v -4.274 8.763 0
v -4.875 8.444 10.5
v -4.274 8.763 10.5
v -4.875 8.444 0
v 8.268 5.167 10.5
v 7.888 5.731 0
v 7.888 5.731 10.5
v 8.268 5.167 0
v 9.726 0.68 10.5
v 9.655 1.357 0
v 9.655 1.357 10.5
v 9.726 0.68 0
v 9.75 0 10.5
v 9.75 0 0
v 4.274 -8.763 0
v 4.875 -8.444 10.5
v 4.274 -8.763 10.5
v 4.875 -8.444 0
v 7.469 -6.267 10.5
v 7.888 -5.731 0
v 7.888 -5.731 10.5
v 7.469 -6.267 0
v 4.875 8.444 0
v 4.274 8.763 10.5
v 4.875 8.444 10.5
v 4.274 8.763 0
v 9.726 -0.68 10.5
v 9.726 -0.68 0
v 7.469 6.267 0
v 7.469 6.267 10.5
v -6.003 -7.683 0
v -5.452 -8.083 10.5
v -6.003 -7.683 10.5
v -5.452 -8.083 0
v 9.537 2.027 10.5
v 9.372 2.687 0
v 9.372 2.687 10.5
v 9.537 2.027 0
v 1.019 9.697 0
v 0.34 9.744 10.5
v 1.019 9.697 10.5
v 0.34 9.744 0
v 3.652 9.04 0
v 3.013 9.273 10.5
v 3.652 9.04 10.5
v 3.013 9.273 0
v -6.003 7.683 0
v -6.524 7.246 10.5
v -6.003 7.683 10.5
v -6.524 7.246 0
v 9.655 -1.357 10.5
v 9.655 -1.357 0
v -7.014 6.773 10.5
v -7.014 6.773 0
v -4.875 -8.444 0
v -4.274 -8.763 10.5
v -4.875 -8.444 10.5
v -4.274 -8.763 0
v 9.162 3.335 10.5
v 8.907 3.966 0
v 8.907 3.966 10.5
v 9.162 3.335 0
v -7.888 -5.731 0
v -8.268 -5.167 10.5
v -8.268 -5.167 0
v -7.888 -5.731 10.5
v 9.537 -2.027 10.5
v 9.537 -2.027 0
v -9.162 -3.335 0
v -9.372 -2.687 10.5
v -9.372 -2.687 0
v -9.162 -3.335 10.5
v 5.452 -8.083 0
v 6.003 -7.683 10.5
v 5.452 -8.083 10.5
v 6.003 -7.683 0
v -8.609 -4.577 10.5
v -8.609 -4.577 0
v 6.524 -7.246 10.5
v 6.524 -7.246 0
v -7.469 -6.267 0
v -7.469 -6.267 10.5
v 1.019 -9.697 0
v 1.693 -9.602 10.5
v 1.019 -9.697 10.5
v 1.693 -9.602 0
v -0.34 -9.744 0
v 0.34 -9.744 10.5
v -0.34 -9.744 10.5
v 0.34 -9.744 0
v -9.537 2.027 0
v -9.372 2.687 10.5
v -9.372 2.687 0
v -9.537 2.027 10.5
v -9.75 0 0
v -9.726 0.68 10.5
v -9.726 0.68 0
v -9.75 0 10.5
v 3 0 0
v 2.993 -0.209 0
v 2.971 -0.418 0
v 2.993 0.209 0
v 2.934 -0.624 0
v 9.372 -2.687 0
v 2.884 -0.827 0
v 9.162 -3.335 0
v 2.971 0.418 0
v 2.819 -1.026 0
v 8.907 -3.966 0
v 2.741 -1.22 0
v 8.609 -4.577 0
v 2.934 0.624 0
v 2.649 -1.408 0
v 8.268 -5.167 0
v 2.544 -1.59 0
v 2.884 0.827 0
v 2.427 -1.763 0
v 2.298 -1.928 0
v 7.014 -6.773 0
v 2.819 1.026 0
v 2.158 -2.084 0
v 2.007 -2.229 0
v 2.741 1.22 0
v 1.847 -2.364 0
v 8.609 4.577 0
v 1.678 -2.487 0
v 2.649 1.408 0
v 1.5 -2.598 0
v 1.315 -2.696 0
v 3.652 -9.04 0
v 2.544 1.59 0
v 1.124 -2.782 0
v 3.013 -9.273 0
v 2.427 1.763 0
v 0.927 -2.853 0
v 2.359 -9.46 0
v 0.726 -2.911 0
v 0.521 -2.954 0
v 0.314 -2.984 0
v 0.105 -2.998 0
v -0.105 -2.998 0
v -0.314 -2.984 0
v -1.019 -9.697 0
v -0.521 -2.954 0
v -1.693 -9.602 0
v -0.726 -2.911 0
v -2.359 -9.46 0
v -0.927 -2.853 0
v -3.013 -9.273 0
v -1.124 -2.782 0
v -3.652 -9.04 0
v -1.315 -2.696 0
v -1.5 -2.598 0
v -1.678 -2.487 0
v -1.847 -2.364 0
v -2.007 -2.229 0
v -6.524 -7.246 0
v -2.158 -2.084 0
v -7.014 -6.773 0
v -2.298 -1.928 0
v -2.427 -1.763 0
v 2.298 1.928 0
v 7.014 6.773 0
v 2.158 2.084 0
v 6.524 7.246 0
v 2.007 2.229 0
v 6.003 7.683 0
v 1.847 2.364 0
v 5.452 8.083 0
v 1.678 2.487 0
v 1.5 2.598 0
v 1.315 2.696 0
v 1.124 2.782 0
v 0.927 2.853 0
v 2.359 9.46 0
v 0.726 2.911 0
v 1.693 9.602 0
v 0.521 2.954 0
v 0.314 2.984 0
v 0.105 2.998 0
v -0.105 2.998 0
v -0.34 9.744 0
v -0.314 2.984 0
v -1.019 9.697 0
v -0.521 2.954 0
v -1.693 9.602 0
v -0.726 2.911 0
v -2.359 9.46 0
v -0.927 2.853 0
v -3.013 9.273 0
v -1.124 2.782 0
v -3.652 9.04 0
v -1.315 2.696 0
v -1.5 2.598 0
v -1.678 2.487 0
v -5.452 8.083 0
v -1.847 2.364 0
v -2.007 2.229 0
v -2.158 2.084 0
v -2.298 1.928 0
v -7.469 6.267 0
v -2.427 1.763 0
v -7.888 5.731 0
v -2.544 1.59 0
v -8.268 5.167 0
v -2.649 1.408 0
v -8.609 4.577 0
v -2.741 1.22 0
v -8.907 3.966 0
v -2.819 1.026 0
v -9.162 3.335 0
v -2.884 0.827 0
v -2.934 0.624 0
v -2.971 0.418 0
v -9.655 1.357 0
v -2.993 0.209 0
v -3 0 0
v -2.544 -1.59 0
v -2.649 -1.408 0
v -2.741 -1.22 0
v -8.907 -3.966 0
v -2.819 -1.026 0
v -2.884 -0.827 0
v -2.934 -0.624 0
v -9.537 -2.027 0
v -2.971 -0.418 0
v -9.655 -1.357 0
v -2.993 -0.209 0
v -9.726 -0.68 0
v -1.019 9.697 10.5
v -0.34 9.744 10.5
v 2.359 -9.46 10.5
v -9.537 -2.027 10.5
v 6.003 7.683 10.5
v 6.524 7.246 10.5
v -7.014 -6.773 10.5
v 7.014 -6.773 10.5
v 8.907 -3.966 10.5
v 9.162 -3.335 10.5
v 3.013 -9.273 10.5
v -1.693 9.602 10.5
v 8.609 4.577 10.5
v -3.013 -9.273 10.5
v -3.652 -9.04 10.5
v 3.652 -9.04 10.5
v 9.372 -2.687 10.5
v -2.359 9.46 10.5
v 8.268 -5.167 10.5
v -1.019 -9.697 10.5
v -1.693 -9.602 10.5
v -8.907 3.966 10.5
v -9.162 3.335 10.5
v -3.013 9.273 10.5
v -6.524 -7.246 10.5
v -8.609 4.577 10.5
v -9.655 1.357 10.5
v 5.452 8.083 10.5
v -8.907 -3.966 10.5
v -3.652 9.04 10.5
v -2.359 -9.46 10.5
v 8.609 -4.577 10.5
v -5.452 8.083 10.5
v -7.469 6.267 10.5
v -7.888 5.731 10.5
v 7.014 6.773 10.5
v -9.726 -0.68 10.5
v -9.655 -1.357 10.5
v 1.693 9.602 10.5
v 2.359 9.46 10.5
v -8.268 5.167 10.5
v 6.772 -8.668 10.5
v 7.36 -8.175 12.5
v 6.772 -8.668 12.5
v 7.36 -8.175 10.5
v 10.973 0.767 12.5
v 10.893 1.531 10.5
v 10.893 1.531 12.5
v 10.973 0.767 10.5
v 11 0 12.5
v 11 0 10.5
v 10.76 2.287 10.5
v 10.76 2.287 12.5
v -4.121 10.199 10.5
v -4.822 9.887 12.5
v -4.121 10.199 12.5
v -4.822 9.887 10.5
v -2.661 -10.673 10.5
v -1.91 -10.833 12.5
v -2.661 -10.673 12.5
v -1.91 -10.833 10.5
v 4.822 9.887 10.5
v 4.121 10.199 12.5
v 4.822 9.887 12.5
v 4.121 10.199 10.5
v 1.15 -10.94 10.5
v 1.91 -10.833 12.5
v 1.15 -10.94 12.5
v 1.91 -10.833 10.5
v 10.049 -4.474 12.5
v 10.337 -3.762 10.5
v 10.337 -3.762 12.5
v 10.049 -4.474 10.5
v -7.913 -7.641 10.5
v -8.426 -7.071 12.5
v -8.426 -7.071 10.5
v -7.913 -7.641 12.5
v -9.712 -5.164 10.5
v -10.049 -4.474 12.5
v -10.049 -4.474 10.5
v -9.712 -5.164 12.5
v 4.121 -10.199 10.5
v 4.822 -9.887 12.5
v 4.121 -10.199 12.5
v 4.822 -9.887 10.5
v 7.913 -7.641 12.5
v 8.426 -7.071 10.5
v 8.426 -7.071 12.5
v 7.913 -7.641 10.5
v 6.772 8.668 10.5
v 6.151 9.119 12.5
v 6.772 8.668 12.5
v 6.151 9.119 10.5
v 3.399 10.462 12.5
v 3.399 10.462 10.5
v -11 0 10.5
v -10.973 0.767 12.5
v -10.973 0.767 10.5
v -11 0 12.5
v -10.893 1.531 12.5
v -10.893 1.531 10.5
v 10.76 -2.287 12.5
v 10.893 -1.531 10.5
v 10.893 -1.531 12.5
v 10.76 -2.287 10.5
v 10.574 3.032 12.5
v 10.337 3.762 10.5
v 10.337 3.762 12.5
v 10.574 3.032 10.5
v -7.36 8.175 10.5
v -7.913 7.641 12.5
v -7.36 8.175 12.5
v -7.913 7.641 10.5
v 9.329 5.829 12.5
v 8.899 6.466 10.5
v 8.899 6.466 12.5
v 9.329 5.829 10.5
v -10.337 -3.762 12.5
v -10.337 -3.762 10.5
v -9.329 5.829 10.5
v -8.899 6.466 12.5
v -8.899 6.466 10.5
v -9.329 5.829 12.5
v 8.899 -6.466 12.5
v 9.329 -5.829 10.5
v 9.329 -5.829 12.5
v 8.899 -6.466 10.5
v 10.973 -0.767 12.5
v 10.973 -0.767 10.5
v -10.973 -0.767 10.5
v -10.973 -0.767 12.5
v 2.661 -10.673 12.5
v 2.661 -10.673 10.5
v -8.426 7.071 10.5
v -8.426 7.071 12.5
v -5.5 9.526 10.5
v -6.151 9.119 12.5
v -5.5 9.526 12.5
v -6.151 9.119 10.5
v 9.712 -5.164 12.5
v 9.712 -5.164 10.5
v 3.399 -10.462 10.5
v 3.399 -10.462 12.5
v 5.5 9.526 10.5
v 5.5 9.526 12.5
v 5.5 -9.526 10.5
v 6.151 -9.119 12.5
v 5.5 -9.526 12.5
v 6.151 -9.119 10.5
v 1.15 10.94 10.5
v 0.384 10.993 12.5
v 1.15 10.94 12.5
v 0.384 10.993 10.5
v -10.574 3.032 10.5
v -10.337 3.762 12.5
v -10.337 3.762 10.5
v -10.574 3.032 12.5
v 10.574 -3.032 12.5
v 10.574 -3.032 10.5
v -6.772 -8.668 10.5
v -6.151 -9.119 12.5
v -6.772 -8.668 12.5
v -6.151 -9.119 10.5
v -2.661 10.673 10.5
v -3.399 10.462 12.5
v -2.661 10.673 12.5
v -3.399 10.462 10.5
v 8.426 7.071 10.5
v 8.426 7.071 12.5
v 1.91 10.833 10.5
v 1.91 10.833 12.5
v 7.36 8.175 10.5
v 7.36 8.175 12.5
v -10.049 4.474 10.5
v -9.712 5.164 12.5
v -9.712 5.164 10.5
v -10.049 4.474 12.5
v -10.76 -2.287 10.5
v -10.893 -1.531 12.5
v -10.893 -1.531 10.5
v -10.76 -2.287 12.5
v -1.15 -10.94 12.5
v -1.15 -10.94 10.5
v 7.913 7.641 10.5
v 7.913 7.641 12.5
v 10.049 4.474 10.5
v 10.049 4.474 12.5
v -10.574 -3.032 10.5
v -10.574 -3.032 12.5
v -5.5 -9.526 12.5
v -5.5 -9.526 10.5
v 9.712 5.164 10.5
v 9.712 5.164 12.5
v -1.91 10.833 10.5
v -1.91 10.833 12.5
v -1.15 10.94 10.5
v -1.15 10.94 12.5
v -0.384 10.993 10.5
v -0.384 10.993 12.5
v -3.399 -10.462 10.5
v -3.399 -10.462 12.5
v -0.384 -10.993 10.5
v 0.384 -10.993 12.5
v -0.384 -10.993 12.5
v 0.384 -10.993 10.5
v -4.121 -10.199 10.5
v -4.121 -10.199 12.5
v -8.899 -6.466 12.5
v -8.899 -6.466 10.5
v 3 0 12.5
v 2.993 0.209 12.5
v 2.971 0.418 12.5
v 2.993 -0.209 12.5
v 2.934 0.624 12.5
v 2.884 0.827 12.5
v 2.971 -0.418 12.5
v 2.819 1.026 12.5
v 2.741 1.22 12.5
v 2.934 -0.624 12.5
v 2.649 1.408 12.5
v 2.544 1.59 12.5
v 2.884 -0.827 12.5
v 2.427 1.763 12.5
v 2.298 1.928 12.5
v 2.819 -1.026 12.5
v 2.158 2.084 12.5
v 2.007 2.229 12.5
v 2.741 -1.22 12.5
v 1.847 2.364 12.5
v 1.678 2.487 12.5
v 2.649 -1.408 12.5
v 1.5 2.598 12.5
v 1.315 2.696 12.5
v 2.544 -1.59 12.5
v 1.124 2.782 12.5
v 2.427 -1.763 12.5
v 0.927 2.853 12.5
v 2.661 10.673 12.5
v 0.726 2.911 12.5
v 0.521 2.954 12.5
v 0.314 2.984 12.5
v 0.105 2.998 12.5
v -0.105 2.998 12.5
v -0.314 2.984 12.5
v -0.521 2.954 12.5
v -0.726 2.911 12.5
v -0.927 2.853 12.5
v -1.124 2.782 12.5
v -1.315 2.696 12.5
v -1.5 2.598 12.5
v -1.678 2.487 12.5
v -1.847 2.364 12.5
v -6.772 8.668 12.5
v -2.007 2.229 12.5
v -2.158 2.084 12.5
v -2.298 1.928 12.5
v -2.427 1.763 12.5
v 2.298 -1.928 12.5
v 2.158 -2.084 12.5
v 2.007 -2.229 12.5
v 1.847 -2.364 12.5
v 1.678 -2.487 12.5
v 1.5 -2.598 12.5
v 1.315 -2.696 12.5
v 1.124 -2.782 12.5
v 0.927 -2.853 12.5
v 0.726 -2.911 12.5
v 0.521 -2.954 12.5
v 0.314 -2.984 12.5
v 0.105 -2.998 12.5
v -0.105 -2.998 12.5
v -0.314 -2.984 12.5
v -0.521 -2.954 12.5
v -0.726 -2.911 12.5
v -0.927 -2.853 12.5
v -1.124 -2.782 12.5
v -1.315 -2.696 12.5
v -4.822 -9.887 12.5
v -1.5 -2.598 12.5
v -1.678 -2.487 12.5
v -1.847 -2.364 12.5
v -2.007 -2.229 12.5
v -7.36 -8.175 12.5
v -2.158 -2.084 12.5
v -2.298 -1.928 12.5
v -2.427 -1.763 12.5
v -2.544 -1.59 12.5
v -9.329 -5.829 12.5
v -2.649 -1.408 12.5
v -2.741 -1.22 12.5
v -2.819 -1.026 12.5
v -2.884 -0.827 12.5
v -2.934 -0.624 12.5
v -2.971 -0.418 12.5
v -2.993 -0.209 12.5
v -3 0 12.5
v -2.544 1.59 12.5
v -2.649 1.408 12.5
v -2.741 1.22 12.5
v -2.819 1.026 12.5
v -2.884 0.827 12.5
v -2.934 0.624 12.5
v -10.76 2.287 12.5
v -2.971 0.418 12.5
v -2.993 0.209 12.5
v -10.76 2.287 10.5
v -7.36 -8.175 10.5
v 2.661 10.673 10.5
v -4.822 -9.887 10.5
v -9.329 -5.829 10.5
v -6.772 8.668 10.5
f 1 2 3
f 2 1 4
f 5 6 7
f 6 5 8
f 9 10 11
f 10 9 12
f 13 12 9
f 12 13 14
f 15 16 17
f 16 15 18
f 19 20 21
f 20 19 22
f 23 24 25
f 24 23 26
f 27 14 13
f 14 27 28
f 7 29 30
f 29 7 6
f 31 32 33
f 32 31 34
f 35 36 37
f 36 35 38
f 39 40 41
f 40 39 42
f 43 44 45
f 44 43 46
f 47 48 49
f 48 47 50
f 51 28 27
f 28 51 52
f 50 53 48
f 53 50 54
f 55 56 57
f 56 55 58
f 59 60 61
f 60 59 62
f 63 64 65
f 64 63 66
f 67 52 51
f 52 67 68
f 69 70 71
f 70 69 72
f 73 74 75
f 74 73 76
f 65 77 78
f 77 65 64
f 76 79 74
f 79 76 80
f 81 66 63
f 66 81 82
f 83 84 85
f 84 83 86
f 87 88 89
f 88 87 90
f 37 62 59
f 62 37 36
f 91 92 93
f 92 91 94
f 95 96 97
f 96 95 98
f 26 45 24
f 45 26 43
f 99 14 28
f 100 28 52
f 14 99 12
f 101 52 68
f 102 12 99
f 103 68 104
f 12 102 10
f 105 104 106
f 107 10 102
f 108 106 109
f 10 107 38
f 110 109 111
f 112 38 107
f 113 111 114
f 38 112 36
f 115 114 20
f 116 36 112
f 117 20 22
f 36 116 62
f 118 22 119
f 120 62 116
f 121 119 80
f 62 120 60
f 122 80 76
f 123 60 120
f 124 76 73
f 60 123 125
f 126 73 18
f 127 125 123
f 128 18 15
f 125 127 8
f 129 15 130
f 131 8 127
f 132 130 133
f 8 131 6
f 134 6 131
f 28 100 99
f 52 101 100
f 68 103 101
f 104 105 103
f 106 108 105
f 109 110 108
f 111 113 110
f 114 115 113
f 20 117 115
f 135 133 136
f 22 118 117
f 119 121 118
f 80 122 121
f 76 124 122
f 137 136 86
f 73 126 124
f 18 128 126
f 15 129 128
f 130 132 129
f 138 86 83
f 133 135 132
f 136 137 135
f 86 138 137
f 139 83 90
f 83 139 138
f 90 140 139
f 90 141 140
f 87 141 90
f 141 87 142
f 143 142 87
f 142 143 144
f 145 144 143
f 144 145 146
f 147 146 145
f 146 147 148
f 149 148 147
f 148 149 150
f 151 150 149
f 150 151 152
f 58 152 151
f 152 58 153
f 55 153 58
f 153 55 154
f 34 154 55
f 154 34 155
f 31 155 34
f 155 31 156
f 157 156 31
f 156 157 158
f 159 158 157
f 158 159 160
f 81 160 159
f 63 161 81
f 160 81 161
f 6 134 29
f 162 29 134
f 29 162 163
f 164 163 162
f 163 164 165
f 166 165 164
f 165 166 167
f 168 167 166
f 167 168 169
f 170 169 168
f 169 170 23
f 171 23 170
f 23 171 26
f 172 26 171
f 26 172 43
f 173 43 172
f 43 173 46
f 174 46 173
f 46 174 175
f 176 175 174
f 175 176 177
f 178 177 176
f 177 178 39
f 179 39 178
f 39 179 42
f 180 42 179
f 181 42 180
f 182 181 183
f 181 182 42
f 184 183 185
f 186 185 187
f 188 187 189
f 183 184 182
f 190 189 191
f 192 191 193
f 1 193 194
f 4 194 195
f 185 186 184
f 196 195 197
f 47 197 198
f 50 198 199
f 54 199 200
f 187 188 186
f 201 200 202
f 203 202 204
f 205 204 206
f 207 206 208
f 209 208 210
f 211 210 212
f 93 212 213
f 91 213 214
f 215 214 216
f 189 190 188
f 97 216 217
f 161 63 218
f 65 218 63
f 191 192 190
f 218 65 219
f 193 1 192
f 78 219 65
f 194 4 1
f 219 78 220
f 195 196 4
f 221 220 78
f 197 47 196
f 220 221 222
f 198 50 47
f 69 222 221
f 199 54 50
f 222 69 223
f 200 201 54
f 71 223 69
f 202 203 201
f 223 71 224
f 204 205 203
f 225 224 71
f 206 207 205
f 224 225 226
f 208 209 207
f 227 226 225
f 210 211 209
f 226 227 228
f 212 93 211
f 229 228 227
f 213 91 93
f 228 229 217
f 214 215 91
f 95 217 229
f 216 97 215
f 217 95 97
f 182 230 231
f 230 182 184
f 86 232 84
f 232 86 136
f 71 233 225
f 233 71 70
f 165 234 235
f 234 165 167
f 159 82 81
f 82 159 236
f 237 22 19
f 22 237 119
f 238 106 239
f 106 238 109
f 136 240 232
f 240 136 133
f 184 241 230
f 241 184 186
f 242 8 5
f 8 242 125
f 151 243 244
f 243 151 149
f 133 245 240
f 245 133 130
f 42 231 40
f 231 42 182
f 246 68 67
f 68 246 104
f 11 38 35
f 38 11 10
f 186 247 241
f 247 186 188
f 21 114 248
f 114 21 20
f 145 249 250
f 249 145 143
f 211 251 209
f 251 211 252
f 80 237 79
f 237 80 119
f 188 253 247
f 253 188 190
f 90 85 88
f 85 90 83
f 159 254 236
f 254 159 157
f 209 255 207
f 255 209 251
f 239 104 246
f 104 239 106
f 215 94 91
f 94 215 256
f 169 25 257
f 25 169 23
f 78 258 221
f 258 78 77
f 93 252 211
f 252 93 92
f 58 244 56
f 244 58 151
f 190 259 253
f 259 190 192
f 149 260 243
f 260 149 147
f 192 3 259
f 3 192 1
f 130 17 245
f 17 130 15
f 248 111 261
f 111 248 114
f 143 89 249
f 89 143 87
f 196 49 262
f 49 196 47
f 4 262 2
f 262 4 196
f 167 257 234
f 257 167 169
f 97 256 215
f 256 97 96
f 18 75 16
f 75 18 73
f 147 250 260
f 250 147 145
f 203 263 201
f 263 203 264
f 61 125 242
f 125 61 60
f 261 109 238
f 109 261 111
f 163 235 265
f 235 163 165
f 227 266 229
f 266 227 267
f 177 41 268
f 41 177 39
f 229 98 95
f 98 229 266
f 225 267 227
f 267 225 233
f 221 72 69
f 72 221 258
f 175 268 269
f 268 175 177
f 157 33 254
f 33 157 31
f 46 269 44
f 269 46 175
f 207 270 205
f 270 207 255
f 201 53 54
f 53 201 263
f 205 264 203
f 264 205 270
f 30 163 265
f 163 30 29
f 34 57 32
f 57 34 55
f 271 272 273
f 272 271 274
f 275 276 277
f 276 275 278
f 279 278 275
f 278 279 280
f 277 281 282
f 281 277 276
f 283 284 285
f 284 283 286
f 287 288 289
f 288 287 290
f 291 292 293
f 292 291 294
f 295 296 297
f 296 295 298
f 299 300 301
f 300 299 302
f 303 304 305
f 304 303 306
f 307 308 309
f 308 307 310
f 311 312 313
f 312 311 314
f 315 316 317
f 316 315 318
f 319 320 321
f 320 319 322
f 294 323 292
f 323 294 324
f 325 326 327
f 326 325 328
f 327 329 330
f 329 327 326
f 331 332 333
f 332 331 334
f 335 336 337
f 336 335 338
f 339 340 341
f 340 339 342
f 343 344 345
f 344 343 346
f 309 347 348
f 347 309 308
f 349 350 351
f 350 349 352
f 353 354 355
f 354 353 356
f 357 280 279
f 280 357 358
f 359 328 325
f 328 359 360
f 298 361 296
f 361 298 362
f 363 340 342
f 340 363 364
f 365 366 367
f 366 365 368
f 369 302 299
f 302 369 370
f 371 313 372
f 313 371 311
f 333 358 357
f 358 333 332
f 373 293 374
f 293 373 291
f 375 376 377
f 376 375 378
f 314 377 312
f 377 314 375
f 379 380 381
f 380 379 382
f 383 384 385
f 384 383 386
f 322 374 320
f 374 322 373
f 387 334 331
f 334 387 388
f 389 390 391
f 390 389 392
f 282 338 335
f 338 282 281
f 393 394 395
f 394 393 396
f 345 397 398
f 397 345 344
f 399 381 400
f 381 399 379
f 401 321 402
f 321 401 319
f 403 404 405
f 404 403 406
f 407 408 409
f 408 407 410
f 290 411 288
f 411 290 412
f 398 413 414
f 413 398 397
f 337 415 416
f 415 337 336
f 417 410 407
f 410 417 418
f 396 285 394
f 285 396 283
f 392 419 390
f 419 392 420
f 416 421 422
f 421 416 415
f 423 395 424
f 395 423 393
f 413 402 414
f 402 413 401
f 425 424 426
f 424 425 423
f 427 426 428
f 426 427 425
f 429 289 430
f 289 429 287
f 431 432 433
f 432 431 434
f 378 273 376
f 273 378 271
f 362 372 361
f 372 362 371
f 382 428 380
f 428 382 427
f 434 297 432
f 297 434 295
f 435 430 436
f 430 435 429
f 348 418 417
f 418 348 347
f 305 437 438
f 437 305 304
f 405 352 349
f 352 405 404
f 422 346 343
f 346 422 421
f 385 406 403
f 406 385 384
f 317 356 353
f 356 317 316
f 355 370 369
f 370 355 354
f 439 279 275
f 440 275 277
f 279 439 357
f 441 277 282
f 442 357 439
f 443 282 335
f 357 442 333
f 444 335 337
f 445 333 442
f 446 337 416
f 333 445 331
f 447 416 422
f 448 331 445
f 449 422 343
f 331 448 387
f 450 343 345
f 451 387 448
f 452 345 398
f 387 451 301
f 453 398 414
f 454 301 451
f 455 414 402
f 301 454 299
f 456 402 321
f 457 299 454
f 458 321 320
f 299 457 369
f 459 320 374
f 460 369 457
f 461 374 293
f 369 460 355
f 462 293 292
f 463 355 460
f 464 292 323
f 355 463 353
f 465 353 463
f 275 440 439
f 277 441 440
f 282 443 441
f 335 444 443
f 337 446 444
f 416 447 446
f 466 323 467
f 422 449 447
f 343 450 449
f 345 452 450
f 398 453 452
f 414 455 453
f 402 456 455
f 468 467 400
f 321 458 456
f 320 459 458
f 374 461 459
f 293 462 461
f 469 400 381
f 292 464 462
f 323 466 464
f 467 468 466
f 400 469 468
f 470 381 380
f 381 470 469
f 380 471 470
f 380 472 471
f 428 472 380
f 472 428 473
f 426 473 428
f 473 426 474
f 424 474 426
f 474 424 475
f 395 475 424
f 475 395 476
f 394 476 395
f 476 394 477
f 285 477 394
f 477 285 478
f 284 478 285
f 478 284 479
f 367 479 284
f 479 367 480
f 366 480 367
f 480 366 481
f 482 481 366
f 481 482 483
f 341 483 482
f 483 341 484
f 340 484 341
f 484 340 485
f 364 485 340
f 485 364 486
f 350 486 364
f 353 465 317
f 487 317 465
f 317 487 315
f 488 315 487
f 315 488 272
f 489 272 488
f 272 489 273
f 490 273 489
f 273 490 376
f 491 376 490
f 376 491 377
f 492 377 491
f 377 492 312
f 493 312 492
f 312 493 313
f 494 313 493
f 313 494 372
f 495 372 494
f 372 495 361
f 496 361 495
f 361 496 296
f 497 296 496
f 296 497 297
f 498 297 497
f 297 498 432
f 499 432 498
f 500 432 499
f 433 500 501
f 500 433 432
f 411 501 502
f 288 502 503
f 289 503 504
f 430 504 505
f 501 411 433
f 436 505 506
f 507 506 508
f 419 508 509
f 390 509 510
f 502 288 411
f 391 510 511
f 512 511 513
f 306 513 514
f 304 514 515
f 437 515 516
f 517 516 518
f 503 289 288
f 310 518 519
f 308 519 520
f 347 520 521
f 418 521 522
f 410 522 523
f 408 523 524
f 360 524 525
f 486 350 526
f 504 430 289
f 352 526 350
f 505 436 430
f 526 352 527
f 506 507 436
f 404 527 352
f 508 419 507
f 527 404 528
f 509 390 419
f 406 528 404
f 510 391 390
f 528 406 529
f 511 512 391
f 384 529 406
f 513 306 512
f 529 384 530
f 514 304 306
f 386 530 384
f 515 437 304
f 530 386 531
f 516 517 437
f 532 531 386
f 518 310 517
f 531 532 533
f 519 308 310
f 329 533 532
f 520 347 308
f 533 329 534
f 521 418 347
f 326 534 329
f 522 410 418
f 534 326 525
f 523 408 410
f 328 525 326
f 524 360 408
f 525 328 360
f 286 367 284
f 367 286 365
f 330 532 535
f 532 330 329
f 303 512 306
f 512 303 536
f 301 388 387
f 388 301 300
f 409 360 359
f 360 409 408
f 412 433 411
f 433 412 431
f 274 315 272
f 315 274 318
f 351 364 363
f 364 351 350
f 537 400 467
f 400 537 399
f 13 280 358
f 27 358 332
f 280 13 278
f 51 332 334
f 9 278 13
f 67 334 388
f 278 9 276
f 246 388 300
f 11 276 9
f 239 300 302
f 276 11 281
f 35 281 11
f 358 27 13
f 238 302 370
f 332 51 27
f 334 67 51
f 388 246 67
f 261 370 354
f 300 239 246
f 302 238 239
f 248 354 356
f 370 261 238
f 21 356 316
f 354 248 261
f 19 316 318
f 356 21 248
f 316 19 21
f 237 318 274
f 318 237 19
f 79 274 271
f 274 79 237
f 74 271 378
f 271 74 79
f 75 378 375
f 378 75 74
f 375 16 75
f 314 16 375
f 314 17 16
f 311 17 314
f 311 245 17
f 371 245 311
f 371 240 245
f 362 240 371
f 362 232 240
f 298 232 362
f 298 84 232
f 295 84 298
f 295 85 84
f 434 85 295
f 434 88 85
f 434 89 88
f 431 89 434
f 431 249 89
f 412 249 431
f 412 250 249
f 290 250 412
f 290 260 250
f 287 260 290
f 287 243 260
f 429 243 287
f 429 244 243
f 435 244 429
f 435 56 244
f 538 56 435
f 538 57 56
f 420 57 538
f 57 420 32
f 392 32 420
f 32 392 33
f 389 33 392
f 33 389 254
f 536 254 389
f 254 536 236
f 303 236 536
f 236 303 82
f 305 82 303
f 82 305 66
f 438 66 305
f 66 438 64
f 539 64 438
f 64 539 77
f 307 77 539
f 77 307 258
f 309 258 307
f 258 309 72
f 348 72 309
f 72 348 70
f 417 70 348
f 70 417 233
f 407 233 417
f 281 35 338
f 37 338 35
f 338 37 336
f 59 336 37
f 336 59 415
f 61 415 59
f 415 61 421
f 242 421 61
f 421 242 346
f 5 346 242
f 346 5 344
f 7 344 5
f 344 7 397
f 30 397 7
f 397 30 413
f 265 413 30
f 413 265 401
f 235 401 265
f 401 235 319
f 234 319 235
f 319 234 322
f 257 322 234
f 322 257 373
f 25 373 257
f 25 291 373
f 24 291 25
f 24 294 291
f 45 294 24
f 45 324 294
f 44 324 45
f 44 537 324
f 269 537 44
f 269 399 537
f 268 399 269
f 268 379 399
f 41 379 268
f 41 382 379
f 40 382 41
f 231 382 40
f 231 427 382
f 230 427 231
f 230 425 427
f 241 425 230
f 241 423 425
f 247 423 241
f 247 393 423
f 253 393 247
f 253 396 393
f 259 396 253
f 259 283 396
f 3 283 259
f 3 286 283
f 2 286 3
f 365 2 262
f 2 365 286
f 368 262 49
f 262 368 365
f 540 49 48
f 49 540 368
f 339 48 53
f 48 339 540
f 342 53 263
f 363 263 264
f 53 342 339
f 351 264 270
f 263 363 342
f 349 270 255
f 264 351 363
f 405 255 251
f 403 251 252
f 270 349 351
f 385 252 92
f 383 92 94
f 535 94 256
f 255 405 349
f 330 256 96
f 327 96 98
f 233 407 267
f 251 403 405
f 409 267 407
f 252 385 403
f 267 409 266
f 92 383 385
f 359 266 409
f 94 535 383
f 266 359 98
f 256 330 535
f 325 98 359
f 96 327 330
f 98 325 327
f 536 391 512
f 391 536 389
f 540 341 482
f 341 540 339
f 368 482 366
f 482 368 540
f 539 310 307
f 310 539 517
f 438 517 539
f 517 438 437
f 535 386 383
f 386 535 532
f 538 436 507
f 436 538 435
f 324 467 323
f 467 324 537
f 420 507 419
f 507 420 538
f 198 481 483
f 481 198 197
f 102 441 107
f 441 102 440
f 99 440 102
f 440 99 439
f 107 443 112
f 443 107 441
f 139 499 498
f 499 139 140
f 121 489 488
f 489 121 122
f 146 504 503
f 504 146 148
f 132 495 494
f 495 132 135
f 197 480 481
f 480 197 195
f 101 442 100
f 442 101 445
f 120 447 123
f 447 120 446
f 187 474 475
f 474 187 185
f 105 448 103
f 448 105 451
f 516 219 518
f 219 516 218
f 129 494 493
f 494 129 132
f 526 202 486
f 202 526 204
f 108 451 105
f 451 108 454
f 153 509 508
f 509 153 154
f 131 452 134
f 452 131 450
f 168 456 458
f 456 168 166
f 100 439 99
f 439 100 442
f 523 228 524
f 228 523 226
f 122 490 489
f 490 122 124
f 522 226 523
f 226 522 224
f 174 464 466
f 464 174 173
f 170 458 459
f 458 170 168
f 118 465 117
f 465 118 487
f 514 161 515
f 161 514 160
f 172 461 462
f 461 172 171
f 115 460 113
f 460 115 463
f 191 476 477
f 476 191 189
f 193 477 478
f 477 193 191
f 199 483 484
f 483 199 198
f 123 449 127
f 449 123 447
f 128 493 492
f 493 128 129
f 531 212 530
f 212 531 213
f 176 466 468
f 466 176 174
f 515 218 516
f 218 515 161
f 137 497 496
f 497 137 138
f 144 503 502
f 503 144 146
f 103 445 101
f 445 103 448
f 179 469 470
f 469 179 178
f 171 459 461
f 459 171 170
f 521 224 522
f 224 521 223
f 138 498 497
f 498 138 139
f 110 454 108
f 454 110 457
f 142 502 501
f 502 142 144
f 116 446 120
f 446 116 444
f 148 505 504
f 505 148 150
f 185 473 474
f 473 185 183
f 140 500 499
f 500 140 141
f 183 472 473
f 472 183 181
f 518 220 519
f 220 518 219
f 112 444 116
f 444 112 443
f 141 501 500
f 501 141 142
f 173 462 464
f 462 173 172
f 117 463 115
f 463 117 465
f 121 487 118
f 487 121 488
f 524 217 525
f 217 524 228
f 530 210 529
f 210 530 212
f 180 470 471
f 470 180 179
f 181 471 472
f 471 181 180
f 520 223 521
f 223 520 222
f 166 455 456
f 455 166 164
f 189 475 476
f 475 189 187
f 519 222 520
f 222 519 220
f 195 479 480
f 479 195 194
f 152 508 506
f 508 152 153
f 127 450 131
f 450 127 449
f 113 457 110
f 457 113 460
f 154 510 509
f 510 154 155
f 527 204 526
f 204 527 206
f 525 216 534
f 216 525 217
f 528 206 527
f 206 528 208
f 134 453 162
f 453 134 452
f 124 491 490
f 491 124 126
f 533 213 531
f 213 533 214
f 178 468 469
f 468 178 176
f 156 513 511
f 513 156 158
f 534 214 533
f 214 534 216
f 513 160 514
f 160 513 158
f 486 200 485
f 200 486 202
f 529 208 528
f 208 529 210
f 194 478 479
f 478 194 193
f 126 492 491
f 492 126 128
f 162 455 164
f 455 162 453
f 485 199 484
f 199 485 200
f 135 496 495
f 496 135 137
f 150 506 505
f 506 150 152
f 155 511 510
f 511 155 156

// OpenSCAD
// bus voor de as van een VO&S spinnewiel aandrijving
// buiten diameter 19.5
// binnen diameter 6 == vlucht arm diameter
// hoogte 11

$fn = 90;

difference() {
  union() {
    cylinder(h=11,d=19.5);
    translate([0,0,10.5])
      cylinder(h=2,d=22);
  };
  cylinder(h=20,d=6);
}
